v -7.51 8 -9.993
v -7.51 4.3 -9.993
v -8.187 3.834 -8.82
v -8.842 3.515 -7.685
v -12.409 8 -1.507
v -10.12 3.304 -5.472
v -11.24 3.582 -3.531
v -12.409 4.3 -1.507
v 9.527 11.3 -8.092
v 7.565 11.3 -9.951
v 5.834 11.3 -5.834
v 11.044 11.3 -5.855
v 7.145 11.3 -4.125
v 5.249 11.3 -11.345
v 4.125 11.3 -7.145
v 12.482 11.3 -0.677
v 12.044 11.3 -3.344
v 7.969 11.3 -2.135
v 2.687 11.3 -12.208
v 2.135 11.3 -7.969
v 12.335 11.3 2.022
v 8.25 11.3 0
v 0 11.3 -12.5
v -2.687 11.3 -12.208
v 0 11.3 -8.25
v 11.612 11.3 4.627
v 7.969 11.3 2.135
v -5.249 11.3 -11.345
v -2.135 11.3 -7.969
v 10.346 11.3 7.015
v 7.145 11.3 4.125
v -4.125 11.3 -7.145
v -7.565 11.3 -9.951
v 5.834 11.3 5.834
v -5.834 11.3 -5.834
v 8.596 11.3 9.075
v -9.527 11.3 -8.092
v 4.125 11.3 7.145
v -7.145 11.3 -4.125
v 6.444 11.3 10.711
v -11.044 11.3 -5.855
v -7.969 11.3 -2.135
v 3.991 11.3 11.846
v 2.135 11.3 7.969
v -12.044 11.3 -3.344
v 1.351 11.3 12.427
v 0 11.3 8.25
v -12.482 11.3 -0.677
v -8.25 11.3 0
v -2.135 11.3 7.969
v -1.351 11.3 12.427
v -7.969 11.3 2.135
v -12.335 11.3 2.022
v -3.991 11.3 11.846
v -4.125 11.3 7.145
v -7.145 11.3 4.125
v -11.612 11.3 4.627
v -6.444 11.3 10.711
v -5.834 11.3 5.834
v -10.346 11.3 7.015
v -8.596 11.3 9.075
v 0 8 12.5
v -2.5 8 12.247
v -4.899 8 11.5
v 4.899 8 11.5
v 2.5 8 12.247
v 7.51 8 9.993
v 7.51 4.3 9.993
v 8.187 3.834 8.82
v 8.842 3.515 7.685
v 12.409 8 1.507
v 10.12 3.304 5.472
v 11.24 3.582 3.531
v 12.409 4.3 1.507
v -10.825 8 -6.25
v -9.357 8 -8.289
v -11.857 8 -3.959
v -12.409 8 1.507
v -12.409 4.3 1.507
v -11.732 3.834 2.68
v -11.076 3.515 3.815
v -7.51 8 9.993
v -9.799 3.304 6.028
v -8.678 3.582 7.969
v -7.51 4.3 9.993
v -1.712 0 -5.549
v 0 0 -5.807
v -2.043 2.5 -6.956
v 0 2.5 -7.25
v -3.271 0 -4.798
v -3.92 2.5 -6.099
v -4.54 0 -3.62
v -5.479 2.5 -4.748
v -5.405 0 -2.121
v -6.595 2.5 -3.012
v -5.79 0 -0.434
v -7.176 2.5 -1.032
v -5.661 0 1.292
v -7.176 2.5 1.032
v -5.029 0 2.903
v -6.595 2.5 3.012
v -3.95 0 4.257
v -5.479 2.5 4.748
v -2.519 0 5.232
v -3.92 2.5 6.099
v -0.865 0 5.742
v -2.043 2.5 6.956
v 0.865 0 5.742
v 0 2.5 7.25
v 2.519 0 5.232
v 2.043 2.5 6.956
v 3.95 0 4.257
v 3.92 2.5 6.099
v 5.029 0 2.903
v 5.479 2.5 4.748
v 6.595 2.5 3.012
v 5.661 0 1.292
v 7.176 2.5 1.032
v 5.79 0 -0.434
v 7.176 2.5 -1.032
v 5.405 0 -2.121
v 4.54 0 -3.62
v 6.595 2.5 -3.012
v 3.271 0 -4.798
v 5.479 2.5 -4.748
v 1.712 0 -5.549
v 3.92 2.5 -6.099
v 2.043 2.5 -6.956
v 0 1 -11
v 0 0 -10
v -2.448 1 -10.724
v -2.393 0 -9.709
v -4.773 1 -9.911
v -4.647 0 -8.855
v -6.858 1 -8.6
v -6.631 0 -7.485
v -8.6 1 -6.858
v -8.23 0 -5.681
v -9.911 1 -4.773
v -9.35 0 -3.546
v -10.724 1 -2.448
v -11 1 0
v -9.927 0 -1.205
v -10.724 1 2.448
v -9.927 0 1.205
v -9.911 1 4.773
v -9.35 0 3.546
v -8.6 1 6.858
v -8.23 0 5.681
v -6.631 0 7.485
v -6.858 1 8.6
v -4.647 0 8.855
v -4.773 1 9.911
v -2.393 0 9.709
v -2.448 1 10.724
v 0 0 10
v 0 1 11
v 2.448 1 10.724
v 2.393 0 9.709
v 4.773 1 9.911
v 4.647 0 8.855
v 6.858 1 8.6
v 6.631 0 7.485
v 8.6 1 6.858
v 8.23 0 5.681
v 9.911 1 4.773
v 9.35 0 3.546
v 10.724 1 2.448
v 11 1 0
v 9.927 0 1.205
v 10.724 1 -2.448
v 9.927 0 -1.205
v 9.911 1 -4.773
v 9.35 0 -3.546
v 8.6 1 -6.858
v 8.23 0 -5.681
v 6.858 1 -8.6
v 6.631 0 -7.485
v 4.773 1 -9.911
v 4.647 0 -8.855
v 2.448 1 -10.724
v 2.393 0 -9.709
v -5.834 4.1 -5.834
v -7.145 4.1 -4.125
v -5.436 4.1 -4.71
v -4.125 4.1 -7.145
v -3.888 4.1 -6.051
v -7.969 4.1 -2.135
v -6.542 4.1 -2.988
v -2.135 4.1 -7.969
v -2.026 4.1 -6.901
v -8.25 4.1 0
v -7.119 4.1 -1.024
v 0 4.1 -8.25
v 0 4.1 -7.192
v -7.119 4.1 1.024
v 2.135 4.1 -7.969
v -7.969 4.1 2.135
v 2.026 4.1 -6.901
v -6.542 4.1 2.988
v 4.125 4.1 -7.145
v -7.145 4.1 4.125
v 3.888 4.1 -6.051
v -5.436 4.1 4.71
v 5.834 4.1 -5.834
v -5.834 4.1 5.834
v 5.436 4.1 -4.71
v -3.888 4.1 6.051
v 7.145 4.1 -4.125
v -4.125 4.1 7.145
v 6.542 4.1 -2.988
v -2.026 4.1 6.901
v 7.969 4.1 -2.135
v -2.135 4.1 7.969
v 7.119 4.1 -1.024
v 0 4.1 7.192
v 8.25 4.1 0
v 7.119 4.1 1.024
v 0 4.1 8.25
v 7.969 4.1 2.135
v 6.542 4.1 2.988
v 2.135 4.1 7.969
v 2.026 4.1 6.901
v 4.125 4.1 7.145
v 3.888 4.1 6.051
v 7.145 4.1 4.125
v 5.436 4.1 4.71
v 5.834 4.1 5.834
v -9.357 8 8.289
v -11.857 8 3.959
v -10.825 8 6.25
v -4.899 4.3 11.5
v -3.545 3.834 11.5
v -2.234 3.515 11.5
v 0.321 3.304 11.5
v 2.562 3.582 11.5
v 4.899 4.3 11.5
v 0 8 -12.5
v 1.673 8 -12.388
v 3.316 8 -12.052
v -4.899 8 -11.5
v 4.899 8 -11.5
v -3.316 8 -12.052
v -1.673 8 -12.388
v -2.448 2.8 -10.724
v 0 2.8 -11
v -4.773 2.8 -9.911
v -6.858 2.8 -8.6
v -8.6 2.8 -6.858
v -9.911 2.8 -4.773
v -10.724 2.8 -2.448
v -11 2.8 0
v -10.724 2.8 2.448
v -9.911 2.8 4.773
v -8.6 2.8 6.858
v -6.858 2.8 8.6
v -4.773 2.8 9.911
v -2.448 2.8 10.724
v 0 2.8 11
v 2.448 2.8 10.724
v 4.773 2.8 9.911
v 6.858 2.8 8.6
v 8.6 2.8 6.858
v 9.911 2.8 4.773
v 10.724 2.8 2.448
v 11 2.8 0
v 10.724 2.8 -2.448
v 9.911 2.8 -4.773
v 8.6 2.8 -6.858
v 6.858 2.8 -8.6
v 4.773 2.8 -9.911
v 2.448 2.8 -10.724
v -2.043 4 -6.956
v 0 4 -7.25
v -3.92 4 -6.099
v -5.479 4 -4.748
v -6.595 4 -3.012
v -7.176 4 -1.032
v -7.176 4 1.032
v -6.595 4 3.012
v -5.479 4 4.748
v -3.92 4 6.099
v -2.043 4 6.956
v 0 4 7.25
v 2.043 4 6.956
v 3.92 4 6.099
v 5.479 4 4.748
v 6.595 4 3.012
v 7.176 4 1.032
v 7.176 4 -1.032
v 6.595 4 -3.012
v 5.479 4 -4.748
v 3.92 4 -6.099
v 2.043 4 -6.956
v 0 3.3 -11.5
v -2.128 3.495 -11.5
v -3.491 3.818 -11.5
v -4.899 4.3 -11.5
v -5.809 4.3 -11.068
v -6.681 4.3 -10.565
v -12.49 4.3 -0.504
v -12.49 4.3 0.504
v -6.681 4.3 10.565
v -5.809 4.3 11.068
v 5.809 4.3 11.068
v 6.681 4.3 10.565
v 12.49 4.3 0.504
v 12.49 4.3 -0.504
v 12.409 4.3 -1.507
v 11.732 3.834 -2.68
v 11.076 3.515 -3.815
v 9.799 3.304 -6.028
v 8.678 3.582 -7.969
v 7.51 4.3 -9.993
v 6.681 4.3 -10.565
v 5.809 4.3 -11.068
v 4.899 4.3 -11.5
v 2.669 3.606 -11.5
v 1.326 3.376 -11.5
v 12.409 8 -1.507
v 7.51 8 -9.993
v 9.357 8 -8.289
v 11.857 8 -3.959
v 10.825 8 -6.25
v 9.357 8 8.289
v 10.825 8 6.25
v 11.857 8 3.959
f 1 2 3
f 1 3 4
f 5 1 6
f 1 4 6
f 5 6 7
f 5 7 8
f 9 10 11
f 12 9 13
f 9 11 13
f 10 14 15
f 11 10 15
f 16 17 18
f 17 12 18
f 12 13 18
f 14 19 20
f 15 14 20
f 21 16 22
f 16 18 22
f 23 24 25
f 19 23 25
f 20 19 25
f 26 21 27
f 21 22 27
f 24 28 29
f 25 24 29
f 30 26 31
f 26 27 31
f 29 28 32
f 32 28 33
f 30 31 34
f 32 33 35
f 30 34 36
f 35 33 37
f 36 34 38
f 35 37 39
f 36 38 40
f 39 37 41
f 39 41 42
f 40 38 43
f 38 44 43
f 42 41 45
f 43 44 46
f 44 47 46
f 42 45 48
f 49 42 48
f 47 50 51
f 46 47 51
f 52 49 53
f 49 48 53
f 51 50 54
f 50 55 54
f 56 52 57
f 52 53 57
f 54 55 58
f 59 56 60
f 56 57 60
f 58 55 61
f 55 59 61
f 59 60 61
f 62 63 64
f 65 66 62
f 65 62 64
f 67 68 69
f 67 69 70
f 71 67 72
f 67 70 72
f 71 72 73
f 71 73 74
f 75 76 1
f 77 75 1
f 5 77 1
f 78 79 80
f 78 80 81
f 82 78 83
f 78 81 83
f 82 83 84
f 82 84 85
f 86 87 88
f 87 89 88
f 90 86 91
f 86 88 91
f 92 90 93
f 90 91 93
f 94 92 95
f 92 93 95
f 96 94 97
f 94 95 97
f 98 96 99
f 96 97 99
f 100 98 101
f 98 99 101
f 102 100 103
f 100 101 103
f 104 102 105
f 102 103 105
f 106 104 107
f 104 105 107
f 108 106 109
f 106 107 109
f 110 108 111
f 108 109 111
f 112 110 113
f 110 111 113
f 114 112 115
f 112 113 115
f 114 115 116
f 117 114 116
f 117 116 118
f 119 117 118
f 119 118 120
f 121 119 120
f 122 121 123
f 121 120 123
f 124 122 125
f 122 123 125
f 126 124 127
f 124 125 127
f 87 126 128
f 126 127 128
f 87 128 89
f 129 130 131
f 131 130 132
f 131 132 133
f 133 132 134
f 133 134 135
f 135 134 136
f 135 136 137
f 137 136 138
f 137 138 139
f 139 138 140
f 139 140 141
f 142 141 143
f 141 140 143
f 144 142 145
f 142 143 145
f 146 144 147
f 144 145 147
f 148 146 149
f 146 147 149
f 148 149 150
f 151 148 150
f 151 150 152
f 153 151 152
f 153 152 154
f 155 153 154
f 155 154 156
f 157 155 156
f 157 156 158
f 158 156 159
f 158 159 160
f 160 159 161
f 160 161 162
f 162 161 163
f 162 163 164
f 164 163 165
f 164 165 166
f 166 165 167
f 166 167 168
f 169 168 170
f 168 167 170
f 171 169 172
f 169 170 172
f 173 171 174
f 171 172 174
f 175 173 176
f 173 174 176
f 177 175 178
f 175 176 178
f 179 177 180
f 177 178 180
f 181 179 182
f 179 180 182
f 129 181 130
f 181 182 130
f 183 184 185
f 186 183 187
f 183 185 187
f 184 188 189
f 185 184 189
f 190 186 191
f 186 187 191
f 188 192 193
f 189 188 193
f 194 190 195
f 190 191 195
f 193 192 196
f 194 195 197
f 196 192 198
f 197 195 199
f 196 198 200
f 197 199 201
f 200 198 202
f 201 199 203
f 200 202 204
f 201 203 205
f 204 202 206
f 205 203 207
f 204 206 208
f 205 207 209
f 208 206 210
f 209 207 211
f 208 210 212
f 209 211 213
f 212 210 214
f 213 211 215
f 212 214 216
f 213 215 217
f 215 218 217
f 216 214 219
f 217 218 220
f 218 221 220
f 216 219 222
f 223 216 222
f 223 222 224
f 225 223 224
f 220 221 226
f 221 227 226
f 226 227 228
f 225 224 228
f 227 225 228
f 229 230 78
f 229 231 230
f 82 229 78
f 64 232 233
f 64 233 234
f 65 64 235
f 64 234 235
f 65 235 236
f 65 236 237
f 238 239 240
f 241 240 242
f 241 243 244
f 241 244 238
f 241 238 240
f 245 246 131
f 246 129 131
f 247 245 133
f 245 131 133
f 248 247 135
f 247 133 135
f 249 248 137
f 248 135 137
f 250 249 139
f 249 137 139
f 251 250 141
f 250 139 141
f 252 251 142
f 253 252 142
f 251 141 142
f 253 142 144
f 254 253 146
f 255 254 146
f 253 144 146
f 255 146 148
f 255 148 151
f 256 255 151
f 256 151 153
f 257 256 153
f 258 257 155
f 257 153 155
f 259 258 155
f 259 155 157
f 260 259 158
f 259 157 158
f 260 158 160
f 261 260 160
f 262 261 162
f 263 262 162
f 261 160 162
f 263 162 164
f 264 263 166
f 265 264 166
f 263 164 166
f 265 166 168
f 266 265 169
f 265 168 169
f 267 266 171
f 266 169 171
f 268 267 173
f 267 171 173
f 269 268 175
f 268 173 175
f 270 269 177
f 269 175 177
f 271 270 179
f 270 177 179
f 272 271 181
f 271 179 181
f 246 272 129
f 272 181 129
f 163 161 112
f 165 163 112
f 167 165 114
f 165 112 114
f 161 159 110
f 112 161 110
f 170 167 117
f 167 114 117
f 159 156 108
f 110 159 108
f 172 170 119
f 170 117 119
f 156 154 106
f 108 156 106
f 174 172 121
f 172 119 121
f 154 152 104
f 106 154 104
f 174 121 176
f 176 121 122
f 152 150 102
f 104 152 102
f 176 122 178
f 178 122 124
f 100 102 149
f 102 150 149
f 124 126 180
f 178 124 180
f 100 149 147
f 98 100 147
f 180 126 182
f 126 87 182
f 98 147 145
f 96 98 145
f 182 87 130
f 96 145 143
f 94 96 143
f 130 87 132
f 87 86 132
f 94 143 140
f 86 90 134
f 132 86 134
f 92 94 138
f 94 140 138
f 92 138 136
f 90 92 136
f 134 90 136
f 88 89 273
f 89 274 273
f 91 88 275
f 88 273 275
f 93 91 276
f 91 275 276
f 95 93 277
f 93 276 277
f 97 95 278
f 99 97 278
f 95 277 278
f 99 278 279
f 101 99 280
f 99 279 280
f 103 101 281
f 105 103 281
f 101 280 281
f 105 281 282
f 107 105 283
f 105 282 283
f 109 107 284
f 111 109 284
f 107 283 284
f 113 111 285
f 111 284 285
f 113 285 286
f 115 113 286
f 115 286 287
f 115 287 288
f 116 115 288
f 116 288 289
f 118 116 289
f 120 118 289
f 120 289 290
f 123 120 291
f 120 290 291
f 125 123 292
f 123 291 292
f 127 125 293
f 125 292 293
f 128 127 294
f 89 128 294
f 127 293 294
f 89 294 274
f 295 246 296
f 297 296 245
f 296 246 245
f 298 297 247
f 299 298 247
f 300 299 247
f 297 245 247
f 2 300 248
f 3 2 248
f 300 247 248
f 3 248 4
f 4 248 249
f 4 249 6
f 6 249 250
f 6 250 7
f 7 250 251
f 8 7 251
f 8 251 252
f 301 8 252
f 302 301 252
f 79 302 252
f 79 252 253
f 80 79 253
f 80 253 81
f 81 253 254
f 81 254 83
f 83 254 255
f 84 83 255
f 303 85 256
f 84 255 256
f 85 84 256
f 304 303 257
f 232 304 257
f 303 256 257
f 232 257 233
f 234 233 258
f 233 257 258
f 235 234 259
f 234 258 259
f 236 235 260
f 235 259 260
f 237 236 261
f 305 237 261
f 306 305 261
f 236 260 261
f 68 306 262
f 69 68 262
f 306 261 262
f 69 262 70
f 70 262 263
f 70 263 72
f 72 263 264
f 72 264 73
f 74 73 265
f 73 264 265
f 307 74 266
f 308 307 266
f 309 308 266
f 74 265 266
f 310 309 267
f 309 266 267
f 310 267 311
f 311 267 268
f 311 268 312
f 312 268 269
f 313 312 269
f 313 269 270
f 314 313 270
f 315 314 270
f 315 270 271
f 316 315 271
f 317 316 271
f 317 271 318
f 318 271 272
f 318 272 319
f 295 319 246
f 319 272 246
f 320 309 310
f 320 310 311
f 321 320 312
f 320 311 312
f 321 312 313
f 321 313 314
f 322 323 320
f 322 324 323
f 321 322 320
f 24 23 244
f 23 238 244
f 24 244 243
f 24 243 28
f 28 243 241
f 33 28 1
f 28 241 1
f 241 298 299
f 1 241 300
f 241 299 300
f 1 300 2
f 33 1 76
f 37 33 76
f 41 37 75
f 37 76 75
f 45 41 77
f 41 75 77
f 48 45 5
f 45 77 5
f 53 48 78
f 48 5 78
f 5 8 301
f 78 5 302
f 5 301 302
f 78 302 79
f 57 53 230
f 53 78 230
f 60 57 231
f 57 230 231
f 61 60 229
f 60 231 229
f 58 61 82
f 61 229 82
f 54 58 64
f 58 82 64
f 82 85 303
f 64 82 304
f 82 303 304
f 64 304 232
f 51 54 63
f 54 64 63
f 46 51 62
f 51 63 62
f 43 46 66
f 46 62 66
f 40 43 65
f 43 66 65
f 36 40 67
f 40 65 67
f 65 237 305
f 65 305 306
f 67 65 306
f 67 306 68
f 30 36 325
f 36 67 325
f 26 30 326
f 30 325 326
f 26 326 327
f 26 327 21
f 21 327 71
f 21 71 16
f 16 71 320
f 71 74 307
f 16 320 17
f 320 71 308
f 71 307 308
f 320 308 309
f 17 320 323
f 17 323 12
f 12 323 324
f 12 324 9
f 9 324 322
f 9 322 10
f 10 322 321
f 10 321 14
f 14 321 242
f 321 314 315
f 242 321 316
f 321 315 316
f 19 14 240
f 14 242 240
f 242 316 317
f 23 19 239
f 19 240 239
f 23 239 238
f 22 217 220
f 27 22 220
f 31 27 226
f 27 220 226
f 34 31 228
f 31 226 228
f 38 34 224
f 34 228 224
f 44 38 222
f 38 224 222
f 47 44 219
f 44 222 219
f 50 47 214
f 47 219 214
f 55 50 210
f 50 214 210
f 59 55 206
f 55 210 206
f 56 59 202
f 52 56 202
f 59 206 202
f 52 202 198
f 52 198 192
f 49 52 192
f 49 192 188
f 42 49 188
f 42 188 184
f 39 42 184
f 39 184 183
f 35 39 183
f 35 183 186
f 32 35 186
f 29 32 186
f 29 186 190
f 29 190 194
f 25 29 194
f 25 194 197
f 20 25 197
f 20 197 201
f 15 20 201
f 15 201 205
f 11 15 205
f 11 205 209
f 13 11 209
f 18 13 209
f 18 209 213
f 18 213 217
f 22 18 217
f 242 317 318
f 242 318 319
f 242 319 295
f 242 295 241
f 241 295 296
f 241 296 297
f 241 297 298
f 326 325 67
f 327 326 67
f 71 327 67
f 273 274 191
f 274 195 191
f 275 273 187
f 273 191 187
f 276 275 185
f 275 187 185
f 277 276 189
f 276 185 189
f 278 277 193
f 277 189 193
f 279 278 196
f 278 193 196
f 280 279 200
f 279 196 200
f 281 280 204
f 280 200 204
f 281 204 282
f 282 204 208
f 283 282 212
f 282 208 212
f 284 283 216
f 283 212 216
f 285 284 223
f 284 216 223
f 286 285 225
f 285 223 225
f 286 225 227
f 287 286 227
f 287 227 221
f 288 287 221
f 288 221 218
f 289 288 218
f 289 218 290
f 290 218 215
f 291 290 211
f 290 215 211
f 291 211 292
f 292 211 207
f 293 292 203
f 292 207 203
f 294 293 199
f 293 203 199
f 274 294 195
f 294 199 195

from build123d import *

# Parameters (mm, degrees)
HOLE_THREAD_D          = 16.5
HOLE_THREAD_DEPTH      = 7.2
SKETCH5_W              = 14
SKETCH5_H              = 1
EXTRUDE_CUT_DEPTH      = 8
CIRCULAR_PATTERN_COUNT = 6


with BuildPart() as part:
    # Sketch0 → Rotation1 (revolve)
    with BuildSketch(Plane.XY, mode=Mode.PRIVATE) as rotation1_sk:
        Polygon((-12.5, 11.3), (-12.5, 4.3), (-11, 2.8), (-11, 1), (-10, 0), (0, 0), (0, 11.3), align=None)
    revolve(rotation1_sk.sketch.rotate(Axis((0, 0, 0), (0, 1, 0)), 270), axis=Axis((0, 0, 0), (0, 1, 0)))

    # Sketch1 → Revolved Cut1 (revolve, cut)
    with BuildSketch(Plane(origin=(0, 0, 0), x_dir=(0, 0, -1), z_dir=(1, 0, 0)), mode=Mode.PRIVATE) as revolved_cut1_sk:
        Polygon((-5.806624327, 0), (-7.25, 2.5), (-7.25, 4), (-7.192264973, 4.1), (0, 4.1), (0, 0), align=None)
    revolve(revolved_cut1_sk.sketch.rotate(Axis((0, 0, 0), (0, 1, 0)), 180), axis=Axis((0, 0, 0), (0, 1, 0)), mode=Mode.SUBTRACT)

    # Hole/Thread
    with Locations(Plane(origin=(0, 11.3, 0), x_dir=(-1, 0, 0), z_dir=(0, 1, 0))):
        with Locations((0, 0)):
            Hole(HOLE_THREAD_D / 2, depth=HOLE_THREAD_DEPTH)

    # Sketch5 → Extrude Cut (cut)
    with BuildSketch(Plane.XZ):
        with Locations((0, 12)):
            Rectangle(SKETCH5_W, SKETCH5_H)
    extrude_cut = extrude(amount=-EXTRUDE_CUT_DEPTH, mode=Mode.SUBTRACT)

    # Circular Pattern: Extrude Cut ×6 about axis
    circular_pattern_axis = Axis((0, 0, 0), (0, 1, 0))
    for i in range(1, CIRCULAR_PATTERN_COUNT):
        add(extrude_cut.rotate(circular_pattern_axis, i * 360 / CIRCULAR_PATTERN_COUNT), mode=Mode.SUBTRACT)


solid = part.part
